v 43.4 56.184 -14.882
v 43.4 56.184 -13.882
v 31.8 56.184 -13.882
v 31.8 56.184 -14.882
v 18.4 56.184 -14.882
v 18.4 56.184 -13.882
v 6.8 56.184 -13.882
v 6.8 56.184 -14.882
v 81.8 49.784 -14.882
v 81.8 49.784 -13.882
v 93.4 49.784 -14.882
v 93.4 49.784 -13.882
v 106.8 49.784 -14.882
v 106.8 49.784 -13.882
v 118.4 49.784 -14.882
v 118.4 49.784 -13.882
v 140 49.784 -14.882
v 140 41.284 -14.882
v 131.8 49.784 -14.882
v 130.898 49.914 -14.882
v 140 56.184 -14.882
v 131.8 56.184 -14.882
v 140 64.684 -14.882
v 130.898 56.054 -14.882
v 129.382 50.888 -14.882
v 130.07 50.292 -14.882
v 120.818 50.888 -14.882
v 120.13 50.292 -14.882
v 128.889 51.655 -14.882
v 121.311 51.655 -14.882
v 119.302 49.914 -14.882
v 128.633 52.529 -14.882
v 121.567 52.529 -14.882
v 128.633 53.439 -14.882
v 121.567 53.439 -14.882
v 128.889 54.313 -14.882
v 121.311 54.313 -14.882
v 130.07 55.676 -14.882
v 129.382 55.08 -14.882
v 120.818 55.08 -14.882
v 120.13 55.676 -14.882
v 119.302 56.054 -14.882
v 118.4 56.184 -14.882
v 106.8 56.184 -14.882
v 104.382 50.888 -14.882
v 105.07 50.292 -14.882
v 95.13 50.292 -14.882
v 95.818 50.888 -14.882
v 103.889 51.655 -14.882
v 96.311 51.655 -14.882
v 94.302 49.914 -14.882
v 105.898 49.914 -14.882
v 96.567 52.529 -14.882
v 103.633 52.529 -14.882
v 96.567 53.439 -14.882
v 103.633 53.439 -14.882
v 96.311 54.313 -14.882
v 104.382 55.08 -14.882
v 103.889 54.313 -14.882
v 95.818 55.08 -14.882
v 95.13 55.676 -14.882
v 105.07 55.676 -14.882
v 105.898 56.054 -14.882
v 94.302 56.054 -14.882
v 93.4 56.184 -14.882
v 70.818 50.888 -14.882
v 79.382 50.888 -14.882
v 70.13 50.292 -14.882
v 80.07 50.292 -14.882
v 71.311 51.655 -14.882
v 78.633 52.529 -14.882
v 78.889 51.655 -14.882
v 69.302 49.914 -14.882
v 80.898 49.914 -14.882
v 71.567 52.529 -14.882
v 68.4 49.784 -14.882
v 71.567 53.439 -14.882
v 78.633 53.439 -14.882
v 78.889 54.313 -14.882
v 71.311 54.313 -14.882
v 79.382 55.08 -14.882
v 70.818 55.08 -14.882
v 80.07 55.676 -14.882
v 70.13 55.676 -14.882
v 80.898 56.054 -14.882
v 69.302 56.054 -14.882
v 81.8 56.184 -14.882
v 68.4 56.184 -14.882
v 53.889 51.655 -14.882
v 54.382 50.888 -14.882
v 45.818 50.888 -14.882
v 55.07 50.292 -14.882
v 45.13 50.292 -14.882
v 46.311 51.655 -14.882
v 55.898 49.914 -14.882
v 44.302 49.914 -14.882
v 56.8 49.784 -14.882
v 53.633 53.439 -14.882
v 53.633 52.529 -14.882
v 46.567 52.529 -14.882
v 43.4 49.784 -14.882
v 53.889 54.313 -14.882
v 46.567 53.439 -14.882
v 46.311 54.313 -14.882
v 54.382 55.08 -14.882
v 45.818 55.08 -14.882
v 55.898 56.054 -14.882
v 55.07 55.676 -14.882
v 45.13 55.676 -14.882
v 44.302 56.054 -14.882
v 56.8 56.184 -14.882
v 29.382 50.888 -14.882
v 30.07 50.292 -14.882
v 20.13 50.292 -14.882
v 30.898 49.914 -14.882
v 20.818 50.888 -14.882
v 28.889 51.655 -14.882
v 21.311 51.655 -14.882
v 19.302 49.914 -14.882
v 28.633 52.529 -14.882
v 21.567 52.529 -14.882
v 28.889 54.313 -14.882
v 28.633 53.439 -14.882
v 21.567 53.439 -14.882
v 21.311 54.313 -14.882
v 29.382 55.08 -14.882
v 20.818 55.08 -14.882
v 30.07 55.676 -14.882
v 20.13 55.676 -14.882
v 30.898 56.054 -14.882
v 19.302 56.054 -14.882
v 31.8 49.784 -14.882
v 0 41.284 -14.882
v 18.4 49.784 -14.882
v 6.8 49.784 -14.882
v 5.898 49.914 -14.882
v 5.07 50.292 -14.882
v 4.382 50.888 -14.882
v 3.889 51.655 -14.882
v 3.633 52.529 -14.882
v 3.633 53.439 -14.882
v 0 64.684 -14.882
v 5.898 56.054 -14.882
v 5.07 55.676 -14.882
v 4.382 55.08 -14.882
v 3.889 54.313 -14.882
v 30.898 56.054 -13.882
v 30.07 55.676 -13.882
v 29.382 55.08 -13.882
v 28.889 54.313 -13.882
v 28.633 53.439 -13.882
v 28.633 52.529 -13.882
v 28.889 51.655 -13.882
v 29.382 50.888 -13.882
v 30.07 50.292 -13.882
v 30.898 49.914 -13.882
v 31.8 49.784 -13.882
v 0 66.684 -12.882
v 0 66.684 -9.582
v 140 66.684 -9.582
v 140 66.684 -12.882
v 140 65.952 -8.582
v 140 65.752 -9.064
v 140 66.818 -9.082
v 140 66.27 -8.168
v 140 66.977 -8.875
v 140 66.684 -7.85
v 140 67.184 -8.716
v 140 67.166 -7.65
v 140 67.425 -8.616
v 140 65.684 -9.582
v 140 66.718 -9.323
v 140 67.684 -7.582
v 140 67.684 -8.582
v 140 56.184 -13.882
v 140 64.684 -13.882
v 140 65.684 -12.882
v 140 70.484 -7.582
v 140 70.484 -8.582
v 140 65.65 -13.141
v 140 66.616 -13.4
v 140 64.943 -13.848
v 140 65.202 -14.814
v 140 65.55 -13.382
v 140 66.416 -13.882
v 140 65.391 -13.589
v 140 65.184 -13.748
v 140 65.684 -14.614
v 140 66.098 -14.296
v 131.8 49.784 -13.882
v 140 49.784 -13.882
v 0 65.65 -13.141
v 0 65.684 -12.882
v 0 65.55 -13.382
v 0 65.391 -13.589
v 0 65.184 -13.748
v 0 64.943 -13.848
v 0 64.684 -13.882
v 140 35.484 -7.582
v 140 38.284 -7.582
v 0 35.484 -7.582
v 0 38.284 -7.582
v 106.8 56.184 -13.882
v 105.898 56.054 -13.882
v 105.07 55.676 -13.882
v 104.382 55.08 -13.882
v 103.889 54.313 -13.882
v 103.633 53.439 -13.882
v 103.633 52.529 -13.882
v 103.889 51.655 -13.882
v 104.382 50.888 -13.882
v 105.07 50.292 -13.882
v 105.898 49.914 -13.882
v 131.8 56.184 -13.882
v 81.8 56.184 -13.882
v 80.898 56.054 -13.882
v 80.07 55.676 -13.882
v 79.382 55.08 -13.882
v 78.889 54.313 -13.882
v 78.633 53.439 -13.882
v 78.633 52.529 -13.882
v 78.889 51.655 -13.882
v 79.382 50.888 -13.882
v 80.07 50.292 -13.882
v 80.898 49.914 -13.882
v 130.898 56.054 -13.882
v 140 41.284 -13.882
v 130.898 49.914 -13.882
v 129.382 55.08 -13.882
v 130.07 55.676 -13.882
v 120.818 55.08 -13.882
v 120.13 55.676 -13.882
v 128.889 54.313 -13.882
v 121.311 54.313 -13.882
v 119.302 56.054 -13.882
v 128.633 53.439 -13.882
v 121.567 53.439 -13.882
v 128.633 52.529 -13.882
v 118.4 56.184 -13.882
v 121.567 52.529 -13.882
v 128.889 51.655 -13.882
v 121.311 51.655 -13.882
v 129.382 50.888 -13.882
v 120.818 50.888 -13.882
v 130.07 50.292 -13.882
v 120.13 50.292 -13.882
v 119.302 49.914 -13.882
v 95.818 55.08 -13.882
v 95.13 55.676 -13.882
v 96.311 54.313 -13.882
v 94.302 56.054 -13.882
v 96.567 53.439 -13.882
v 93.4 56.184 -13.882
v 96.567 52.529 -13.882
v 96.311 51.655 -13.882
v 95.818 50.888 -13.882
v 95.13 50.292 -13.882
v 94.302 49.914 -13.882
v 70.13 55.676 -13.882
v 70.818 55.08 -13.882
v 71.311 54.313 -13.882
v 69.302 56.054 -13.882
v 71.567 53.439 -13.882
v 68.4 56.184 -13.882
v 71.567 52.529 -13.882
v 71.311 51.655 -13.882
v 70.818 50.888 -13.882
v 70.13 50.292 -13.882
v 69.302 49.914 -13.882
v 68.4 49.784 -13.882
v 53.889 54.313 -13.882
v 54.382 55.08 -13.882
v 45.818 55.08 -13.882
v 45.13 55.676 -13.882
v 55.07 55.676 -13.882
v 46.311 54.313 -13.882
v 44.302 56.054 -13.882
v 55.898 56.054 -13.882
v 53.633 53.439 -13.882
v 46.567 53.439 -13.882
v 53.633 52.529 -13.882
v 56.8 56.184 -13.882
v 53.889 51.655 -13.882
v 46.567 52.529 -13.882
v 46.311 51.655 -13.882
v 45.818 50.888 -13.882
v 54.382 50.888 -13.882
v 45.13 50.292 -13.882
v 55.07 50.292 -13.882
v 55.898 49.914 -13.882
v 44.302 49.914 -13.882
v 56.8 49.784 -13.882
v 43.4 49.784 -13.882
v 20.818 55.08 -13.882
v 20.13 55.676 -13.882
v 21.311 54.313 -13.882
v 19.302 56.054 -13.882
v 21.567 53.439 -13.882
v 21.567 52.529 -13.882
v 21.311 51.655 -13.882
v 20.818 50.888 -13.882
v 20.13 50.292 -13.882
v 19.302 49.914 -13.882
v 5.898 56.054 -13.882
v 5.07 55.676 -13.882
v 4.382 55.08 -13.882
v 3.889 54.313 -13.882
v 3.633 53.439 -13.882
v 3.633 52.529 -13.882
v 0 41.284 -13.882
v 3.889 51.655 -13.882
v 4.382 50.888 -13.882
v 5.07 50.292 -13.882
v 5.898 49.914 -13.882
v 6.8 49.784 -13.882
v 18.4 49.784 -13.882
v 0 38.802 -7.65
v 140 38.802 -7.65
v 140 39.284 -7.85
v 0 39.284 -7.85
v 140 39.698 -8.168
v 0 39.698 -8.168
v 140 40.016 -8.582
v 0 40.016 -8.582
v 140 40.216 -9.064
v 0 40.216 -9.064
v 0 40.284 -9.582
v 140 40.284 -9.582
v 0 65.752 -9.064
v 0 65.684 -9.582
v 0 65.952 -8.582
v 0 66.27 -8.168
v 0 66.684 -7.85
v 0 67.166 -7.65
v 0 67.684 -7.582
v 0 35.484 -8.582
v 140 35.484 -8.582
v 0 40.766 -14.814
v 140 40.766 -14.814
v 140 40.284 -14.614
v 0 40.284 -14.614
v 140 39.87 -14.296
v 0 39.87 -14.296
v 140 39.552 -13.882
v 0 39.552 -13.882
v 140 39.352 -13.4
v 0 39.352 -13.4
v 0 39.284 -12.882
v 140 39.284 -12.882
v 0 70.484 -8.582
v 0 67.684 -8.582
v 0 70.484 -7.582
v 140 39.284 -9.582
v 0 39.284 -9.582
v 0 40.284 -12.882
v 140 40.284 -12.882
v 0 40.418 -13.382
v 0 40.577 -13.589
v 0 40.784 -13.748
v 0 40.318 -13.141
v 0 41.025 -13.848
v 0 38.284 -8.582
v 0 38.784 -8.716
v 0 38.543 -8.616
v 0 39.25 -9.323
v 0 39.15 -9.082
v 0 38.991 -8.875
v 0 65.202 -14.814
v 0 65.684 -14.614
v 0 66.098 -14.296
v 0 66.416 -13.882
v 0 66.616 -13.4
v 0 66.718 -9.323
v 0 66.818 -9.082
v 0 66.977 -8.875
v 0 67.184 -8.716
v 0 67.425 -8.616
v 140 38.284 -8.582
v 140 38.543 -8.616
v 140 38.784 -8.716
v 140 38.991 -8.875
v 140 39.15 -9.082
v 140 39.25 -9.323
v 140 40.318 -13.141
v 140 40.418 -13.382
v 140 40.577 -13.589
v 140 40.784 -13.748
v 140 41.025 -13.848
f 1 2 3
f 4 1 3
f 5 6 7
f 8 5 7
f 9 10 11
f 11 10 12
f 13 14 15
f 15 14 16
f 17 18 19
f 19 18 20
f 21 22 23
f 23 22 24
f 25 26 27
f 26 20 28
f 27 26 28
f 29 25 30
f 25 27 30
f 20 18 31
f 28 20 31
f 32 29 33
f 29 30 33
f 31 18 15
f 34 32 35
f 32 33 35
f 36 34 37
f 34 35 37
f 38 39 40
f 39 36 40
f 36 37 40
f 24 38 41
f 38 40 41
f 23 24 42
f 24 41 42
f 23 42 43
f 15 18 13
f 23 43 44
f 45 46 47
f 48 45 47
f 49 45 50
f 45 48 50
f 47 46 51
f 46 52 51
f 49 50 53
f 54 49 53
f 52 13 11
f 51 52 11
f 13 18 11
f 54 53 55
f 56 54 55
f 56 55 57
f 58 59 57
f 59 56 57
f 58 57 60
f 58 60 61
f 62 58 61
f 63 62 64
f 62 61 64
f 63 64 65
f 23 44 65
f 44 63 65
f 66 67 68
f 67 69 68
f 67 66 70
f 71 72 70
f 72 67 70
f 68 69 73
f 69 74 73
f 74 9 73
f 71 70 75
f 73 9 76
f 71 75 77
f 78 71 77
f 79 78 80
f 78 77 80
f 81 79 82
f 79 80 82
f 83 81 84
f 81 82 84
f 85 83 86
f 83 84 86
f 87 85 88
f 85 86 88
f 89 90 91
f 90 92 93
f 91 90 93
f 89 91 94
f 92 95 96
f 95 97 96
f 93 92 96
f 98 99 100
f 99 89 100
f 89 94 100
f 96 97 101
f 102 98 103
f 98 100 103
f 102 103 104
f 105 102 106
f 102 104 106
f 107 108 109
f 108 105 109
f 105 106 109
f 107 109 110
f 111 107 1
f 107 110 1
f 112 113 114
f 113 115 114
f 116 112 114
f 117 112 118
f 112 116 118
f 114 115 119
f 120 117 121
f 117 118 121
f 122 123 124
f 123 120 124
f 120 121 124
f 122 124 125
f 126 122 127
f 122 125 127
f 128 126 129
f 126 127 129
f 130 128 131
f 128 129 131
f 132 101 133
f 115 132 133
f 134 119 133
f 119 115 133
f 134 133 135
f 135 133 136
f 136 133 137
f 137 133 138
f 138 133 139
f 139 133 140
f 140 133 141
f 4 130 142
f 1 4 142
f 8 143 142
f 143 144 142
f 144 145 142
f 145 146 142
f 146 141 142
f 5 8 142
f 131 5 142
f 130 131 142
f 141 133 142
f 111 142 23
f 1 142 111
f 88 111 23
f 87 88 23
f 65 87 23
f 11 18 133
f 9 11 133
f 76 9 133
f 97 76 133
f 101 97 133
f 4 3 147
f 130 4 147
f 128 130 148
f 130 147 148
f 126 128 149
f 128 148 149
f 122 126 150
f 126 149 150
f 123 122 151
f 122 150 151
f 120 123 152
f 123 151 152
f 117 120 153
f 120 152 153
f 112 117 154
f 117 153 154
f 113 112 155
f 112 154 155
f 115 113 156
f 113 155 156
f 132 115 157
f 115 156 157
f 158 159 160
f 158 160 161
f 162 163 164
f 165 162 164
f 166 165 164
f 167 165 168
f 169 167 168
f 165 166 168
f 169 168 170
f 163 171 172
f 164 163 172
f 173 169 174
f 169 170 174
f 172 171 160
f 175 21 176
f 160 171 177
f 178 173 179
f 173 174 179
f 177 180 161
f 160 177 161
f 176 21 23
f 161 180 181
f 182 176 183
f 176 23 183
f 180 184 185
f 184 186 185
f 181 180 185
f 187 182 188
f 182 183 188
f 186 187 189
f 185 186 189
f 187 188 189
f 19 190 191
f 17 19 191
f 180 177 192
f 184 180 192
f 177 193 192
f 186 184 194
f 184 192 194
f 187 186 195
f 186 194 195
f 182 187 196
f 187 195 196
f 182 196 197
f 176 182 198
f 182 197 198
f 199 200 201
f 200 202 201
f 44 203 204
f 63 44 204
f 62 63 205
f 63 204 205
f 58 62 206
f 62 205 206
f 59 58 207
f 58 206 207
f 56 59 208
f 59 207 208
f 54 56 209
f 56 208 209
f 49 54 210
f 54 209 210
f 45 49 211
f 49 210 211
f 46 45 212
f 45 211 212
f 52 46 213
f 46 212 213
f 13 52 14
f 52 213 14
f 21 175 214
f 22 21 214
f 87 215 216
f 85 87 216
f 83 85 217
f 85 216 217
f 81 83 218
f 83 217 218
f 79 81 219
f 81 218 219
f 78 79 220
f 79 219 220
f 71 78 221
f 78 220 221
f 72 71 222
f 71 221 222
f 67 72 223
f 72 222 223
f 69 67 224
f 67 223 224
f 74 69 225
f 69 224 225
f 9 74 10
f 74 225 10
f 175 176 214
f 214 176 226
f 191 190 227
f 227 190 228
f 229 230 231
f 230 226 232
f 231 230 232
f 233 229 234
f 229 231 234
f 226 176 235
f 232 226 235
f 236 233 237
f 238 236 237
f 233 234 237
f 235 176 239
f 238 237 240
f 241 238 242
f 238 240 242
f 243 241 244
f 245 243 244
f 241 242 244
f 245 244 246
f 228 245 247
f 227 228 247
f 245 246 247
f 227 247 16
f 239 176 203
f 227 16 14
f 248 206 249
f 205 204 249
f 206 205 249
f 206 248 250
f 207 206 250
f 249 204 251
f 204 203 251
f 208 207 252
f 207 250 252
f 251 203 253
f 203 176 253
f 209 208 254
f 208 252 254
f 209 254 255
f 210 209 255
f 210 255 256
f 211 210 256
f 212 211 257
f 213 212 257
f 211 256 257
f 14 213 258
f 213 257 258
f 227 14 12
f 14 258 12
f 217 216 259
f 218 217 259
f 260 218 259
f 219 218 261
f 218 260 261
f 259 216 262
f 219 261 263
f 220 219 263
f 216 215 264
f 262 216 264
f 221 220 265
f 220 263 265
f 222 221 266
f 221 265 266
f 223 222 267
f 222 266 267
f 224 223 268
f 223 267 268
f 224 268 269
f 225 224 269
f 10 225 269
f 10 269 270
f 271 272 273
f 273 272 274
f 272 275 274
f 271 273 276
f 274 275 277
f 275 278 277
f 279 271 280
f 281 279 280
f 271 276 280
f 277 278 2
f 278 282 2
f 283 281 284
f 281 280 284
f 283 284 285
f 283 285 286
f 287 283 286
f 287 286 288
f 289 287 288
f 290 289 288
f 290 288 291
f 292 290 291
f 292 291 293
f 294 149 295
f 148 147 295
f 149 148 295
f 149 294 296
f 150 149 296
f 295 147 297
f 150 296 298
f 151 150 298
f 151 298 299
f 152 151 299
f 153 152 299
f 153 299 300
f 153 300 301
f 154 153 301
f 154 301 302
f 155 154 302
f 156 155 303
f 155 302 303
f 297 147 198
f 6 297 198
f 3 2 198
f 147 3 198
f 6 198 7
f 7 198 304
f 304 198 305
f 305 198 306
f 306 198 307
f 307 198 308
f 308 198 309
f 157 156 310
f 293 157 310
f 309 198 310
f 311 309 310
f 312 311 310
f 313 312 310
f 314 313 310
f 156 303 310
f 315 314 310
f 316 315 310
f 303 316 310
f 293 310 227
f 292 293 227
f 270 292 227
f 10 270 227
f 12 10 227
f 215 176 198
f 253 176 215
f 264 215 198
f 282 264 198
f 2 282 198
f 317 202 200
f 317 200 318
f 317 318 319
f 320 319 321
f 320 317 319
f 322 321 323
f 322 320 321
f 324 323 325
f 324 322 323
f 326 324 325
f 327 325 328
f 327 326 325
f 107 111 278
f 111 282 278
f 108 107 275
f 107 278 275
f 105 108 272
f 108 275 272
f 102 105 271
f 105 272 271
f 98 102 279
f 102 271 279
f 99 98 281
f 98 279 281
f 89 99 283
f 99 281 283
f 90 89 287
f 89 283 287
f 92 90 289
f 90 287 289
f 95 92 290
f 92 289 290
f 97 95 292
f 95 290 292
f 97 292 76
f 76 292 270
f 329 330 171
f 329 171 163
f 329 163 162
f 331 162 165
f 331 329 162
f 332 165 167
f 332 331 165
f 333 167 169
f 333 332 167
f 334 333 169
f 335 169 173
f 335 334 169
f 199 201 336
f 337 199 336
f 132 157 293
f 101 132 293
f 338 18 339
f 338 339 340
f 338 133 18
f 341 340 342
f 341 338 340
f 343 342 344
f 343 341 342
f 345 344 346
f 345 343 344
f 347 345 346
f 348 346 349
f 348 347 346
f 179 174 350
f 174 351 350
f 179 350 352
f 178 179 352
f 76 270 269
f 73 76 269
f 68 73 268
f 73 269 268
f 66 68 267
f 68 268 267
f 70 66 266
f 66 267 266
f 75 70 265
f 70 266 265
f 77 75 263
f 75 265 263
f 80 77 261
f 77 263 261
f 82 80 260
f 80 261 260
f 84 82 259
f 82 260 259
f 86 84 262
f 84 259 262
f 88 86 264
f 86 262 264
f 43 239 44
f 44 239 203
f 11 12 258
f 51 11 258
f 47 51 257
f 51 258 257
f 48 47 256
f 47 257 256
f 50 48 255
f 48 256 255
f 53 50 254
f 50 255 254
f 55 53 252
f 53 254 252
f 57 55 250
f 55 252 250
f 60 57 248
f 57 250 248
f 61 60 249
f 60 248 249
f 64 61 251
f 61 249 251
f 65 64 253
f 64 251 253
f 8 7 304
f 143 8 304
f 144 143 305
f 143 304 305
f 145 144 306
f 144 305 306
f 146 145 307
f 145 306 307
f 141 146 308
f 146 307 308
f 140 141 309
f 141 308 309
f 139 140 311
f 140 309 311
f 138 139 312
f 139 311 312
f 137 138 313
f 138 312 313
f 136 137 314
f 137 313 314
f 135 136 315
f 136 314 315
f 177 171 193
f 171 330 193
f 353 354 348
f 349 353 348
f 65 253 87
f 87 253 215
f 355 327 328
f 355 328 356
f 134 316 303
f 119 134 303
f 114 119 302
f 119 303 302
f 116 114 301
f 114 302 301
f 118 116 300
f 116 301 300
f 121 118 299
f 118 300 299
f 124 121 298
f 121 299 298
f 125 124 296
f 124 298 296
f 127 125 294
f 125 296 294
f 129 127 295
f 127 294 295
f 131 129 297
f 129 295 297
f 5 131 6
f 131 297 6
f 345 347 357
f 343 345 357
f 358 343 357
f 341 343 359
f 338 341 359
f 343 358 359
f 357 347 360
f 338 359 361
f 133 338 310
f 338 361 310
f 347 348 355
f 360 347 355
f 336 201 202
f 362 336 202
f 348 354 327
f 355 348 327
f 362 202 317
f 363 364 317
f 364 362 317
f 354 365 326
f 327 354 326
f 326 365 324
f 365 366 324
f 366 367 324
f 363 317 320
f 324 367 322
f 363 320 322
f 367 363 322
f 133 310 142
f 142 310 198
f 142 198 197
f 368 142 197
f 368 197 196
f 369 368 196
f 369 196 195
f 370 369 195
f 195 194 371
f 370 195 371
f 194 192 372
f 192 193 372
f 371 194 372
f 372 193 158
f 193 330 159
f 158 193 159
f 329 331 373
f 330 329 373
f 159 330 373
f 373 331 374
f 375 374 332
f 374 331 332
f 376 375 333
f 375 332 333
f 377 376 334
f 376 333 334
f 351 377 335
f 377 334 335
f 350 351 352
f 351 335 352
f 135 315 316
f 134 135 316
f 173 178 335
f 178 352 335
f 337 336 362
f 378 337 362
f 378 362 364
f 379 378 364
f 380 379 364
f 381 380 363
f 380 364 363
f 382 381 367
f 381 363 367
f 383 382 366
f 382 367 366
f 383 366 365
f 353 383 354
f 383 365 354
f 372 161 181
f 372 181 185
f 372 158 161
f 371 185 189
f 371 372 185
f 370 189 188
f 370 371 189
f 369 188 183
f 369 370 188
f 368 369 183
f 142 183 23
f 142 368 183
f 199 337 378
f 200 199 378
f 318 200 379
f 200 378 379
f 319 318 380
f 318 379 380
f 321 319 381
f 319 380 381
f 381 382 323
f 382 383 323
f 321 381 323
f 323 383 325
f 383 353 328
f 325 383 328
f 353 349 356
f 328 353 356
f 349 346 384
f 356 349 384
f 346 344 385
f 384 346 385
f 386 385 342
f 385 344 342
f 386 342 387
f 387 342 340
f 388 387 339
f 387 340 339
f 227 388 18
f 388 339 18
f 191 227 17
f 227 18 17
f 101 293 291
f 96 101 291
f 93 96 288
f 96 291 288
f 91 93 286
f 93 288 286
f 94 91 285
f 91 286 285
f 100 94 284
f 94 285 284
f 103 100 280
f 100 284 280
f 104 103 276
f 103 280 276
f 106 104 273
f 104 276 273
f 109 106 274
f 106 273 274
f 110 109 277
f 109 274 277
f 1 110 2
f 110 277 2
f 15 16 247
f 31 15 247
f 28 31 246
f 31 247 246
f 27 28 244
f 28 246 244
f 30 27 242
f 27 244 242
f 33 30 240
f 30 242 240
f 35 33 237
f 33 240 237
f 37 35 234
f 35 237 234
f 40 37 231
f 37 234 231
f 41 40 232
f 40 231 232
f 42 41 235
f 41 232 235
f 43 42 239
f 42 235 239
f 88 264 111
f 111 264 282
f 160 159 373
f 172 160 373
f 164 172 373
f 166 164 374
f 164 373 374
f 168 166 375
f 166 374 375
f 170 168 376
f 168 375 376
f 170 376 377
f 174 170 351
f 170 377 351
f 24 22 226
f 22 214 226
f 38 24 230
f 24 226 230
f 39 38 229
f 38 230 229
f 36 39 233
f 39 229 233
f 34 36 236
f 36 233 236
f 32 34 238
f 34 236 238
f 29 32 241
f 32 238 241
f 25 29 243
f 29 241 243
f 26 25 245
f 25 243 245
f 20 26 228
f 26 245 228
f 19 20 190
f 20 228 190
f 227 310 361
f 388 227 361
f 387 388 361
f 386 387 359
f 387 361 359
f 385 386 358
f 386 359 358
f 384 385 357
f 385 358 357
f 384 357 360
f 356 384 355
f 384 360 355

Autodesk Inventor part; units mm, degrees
ref_plane "YZ Plane" through (0, 0, 0) normal (1, 0, 0) x (0, 1, 0)
ref_plane "XZ Plane" through (0, 0, 0) normal (0, 1, 0) x (-1, 0, 0)
ref_plane "XY Plane" through (0, 0, 0) normal (0, 0, 1) x (1, 0, 0)
sketch "Sketch1" plane through (0, 0, 0) normal (1, 0, 0) x (0, 1, 0)
  line L0 (41.284, -14.8819) -> (64.684, -14.8819)
  line L1 (64.684, -13.8819) -> (41.284, -13.8819)
  line L2 (67.684, -8.5819) -> (70.484, -8.5819)
  line L3 (70.484, -8.5819) -> (70.484, -7.5819)
  line L4 (70.484, -7.5819) -> (67.684, -7.5819)
  line L5 (-1817770.1114, -20.3632) -> (-1817770.1114, -8.5819)
  line L6 (38.284, -7.5819) -> (35.484, -7.5819)
  line L7 (35.484, -7.5819) -> (35.484, -8.5819)
  line L8 (35.484, -8.5819) -> (38.284, -8.5819)
  line L9 (40.284, -9.5819) -> (40.284, -12.8819)
  arc A0 (67.684, -8.5819) -> (66.684, -9.5819) centre (67.684, -9.5819) ccw
  arc A1 (64.684, -13.8819) -> (65.684, -12.8819) centre (64.684, -12.8819) ccw
  arc A2 (40.284, -12.8819) -> (41.284, -13.8819) centre (41.284, -12.8819) ccw
  arc A3 (39.284, -9.5819) -> (38.284, -8.5819) centre (38.284, -9.5819) ccw
  arc A4 (40.284, -9.5819) -> (38.284, -7.5819) centre (38.284, -9.5819) ccw
  arc A5 (39.284, -12.8819) -> (41.284, -14.8819) centre (41.284, -12.8819) ccw
  line L10 (39.284, -9.5819) -> (39.284, -12.8819)
  arc A6 (67.684, -7.5819) -> (65.684, -9.5819) centre (67.684, -9.5819) ccw
  arc A7 (64.684, -14.8819) -> (66.684, -12.8819) centre (64.684, -12.8819) ccw
  line L11 (66.684, -9.5819) -> (66.684, -12.8819)
  line L12 (65.684, -9.5819) -> (65.684, -12.8819)
  line L13 (52.984, -4.8951) -> (52.984, -40.6352) construction
  line L14 (-285.558, -25.9225) -> (179.442, -25.9225) projected
  line L15 (179.442, -25.9225) -> (179.442, -22.9225) projected
  line L16 (-285.558, -22.9225) -> (179.442, -22.9225) projected
  line L17 (-285.558, -25.9225) -> (-285.558, -22.9225) projected
  point P0 (0, 0)
  point P1 (40.284, -11.2319)
  dimension "d0" = 1
  dimension "d1" = 1
  dimension "d5" = 35
  dimension "d8" = 7.3
  dimension "d9" = 1
  dimension "d10" = 1
  dimension "d11" = 2
  dimension "d12" = 2
  dimension "d13" = 12.7
  dimension "d15" = 12.7
  dimension "d16" = 4.8
  dimension "d17" = 4.8
  dimension "d20" = 1
  dimension "d21" = 1
  dimension "d22" = 2
extrude "Extrusion1" add sketch "Sketch1" along normal blind 300 contours A5 L10 A3 L8 L7 L6 A4 L9 A2 L1 A1 L12 A6 L4 L3 L2 A0 L11 A7 L0
sketch "Sketch2" plane through (0, 41.284, -13.8819) normal (0, 0, 1) x (1, 0, 0)
  line L0 (3.6, 11.7) -> (21.6, 11.7) construction
  line L1 (6.8, 8.5) -> (18.4, 8.5)
  line L2 (18.4, 14.9) -> (6.8, 14.9)
  arc A0 (6.8, 14.9) -> (6.8, 8.5) centre (6.8, 11.7) ccw
  arc A1 (18.4, 8.5) -> (18.4, 14.9) centre (18.4, 11.7) ccw
  line L3 (0, 29.2) -> (300, 29.2) projected
  line L4 (0, -5.8) -> (300, -5.8) projected
  line L5 (0, 23.4) -> (0, 0) projected
  arc A2 (31.8, 14.9) -> (31.8, 8.5) centre (31.8, 11.7) ccw
  line L6 (31.8, 8.5) -> (43.4, 8.5)
  arc A3 (43.4, 8.5) -> (43.4, 14.9) centre (43.4, 11.7) ccw
  line L7 (43.4, 14.9) -> (31.8, 14.9)
  arc A4 (56.8, 14.9) -> (56.8, 8.5) centre (56.8, 11.7) ccw
  line L8 (56.8, 8.5) -> (68.4, 8.5)
  arc A5 (68.4, 8.5) -> (68.4, 14.9) centre (68.4, 11.7) ccw
  line L9 (68.4, 14.9) -> (56.8, 14.9)
  arc A6 (81.8, 14.9) -> (81.8, 8.5) centre (81.8, 11.7) ccw
  line L10 (81.8, 8.5) -> (93.4, 8.5)
  arc A7 (93.4, 8.5) -> (93.4, 14.9) centre (93.4, 11.7) ccw
  line L11 (93.4, 14.9) -> (81.8, 14.9)
  arc A8 (106.8, 14.9) -> (106.8, 8.5) centre (106.8, 11.7) ccw
  line L12 (106.8, 8.5) -> (118.4, 8.5)
  arc A9 (118.4, 8.5) -> (118.4, 14.9) centre (118.4, 11.7) ccw
  line L13 (118.4, 14.9) -> (106.8, 14.9)
  arc A10 (131.8, 14.9) -> (131.8, 8.5) centre (131.8, 11.7) ccw
  line L14 (131.8, 8.5) -> (143.4, 8.5)
  arc A11 (143.4, 8.5) -> (143.4, 14.9) centre (143.4, 11.7) ccw
  line L15 (143.4, 14.9) -> (131.8, 14.9)
  arc A12 (156.8, 14.9) -> (156.8, 8.5) centre (156.8, 11.7) ccw
  line L16 (156.8, 8.5) -> (168.4, 8.5)
  arc A13 (168.4, 8.5) -> (168.4, 14.9) centre (168.4, 11.7) ccw
  line L17 (168.4, 14.9) -> (156.8, 14.9)
  arc A14 (181.8, 14.9) -> (181.8, 8.5) centre (181.8, 11.7) ccw
  line L18 (181.8, 8.5) -> (193.4, 8.5)
  arc A15 (193.4, 8.5) -> (193.4, 14.9) centre (193.4, 11.7) ccw
  line L19 (193.4, 14.9) -> (181.8, 14.9)
  line L20 (0, 0) -> (300, 0) projected
  line L21 (0, 24.4) -> (300, 24.4) projected
  line L22 (0, -1) -> (300, -1) projected
  arc A16 (206.8, 14.9) -> (206.8, 8.5) centre (206.8, 11.7) ccw
  line L23 (218.4, 14.9) -> (206.8, 14.9)
  arc A17 (218.4, 8.5) -> (218.4, 14.9) centre (218.4, 11.7) ccw
  line L24 (206.8, 8.5) -> (218.4, 8.5)
  arc A18 (231.8, 14.9) -> (231.8, 8.5) centre (231.8, 11.7) ccw
  line L25 (243.4, 14.9) -> (231.8, 14.9)
  arc A19 (243.4, 8.5) -> (243.4, 14.9) centre (243.4, 11.7) ccw
  line L26 (231.8, 8.5) -> (243.4, 8.5)
  arc A20 (256.8, 14.9) -> (256.8, 8.5) centre (256.8, 11.7) ccw
  line L27 (268.4, 14.9) -> (256.8, 14.9)
  arc A21 (268.4, 8.5) -> (268.4, 14.9) centre (268.4, 11.7) ccw
  line L28 (256.8, 8.5) -> (268.4, 8.5)
  arc A22 (281.8, 14.9) -> (281.8, 8.5) centre (281.8, 11.7) ccw
  line L29 (293.4, 14.9) -> (281.8, 14.9)
  arc A23 (293.4, 8.5) -> (293.4, 14.9) centre (293.4, 11.7) ccw
  line L30 (281.8, 8.5) -> (293.4, 8.5)
  point P0 (0, -41.284)
  point P1 (12.6, 11.7)
  point P2 (28.6, 11.7)
  point P3 (46.6, 11.7)
  point P4 (53.6, 11.7)
  point P5 (71.6, 11.7)
  point P6 (78.6, 11.7)
  point P7 (96.6, 11.7)
  point P8 (103.6, 11.7)
  point P9 (121.6, 11.7)
  point P10 (128.6, 11.7)
  point P11 (146.6, 11.7)
  point P12 (153.6, 11.7)
  point P13 (171.6, 11.7)
  point P14 (178.6, 11.7)
  point P15 (196.6, 11.7)
  point P16 (28.6, 11.7)
  point P17 (203.6, 11.7)
  point P18 (221.6, 11.7)
  point P19 (228.6, 11.7)
  point P20 (246.6, 11.7)
  point P21 (253.6, 11.7)
  point P22 (271.6, 11.7)
  point P23 (278.6, 11.7)
  point P24 (296.6, 11.7)
  dimension "d26" = 18
  dimension "d33" = 25
  dimension "d46" = 3.6
  dimension "d47" = 17.5
  dimension "d48" = 17.5
  dimension "d51" = 25
extrude "Extrusion2" cut sketch "Sketch2" against normal blind 25
sketch "Sketch3" plane through (0, 41.284, -13.8819) normal (0, 0, 1) x (1, 0, 0)
  line L0 (140, 34.2) -> (302, 34.2)
  line L1 (302, 34.2) -> (302, -10.8)
  line L2 (302, -10.8) -> (140, -10.8)
  line L3 (140, -10.8) -> (140, 34.2)
  line L4 (0, 23.4) -> (0, 0) projected
  line L5 (300, 23.4) -> (300, 0) projected
  line L6 (0, -5.8) -> (300, -5.8) projected
  line L7 (0, 29.2) -> (300, 29.2) projected
  point P0 (0, -41.284)
  dimension "d56" = 140
  dimension "d57" = 2
  dimension "d58" = 5
  dimension "d59" = 5
extrude "Extrusion3" cut sketch "Sketch3" along normal through all both and the other way through all
equation "\"d39\" = d33"
properties part number "DIN-rail-short"
